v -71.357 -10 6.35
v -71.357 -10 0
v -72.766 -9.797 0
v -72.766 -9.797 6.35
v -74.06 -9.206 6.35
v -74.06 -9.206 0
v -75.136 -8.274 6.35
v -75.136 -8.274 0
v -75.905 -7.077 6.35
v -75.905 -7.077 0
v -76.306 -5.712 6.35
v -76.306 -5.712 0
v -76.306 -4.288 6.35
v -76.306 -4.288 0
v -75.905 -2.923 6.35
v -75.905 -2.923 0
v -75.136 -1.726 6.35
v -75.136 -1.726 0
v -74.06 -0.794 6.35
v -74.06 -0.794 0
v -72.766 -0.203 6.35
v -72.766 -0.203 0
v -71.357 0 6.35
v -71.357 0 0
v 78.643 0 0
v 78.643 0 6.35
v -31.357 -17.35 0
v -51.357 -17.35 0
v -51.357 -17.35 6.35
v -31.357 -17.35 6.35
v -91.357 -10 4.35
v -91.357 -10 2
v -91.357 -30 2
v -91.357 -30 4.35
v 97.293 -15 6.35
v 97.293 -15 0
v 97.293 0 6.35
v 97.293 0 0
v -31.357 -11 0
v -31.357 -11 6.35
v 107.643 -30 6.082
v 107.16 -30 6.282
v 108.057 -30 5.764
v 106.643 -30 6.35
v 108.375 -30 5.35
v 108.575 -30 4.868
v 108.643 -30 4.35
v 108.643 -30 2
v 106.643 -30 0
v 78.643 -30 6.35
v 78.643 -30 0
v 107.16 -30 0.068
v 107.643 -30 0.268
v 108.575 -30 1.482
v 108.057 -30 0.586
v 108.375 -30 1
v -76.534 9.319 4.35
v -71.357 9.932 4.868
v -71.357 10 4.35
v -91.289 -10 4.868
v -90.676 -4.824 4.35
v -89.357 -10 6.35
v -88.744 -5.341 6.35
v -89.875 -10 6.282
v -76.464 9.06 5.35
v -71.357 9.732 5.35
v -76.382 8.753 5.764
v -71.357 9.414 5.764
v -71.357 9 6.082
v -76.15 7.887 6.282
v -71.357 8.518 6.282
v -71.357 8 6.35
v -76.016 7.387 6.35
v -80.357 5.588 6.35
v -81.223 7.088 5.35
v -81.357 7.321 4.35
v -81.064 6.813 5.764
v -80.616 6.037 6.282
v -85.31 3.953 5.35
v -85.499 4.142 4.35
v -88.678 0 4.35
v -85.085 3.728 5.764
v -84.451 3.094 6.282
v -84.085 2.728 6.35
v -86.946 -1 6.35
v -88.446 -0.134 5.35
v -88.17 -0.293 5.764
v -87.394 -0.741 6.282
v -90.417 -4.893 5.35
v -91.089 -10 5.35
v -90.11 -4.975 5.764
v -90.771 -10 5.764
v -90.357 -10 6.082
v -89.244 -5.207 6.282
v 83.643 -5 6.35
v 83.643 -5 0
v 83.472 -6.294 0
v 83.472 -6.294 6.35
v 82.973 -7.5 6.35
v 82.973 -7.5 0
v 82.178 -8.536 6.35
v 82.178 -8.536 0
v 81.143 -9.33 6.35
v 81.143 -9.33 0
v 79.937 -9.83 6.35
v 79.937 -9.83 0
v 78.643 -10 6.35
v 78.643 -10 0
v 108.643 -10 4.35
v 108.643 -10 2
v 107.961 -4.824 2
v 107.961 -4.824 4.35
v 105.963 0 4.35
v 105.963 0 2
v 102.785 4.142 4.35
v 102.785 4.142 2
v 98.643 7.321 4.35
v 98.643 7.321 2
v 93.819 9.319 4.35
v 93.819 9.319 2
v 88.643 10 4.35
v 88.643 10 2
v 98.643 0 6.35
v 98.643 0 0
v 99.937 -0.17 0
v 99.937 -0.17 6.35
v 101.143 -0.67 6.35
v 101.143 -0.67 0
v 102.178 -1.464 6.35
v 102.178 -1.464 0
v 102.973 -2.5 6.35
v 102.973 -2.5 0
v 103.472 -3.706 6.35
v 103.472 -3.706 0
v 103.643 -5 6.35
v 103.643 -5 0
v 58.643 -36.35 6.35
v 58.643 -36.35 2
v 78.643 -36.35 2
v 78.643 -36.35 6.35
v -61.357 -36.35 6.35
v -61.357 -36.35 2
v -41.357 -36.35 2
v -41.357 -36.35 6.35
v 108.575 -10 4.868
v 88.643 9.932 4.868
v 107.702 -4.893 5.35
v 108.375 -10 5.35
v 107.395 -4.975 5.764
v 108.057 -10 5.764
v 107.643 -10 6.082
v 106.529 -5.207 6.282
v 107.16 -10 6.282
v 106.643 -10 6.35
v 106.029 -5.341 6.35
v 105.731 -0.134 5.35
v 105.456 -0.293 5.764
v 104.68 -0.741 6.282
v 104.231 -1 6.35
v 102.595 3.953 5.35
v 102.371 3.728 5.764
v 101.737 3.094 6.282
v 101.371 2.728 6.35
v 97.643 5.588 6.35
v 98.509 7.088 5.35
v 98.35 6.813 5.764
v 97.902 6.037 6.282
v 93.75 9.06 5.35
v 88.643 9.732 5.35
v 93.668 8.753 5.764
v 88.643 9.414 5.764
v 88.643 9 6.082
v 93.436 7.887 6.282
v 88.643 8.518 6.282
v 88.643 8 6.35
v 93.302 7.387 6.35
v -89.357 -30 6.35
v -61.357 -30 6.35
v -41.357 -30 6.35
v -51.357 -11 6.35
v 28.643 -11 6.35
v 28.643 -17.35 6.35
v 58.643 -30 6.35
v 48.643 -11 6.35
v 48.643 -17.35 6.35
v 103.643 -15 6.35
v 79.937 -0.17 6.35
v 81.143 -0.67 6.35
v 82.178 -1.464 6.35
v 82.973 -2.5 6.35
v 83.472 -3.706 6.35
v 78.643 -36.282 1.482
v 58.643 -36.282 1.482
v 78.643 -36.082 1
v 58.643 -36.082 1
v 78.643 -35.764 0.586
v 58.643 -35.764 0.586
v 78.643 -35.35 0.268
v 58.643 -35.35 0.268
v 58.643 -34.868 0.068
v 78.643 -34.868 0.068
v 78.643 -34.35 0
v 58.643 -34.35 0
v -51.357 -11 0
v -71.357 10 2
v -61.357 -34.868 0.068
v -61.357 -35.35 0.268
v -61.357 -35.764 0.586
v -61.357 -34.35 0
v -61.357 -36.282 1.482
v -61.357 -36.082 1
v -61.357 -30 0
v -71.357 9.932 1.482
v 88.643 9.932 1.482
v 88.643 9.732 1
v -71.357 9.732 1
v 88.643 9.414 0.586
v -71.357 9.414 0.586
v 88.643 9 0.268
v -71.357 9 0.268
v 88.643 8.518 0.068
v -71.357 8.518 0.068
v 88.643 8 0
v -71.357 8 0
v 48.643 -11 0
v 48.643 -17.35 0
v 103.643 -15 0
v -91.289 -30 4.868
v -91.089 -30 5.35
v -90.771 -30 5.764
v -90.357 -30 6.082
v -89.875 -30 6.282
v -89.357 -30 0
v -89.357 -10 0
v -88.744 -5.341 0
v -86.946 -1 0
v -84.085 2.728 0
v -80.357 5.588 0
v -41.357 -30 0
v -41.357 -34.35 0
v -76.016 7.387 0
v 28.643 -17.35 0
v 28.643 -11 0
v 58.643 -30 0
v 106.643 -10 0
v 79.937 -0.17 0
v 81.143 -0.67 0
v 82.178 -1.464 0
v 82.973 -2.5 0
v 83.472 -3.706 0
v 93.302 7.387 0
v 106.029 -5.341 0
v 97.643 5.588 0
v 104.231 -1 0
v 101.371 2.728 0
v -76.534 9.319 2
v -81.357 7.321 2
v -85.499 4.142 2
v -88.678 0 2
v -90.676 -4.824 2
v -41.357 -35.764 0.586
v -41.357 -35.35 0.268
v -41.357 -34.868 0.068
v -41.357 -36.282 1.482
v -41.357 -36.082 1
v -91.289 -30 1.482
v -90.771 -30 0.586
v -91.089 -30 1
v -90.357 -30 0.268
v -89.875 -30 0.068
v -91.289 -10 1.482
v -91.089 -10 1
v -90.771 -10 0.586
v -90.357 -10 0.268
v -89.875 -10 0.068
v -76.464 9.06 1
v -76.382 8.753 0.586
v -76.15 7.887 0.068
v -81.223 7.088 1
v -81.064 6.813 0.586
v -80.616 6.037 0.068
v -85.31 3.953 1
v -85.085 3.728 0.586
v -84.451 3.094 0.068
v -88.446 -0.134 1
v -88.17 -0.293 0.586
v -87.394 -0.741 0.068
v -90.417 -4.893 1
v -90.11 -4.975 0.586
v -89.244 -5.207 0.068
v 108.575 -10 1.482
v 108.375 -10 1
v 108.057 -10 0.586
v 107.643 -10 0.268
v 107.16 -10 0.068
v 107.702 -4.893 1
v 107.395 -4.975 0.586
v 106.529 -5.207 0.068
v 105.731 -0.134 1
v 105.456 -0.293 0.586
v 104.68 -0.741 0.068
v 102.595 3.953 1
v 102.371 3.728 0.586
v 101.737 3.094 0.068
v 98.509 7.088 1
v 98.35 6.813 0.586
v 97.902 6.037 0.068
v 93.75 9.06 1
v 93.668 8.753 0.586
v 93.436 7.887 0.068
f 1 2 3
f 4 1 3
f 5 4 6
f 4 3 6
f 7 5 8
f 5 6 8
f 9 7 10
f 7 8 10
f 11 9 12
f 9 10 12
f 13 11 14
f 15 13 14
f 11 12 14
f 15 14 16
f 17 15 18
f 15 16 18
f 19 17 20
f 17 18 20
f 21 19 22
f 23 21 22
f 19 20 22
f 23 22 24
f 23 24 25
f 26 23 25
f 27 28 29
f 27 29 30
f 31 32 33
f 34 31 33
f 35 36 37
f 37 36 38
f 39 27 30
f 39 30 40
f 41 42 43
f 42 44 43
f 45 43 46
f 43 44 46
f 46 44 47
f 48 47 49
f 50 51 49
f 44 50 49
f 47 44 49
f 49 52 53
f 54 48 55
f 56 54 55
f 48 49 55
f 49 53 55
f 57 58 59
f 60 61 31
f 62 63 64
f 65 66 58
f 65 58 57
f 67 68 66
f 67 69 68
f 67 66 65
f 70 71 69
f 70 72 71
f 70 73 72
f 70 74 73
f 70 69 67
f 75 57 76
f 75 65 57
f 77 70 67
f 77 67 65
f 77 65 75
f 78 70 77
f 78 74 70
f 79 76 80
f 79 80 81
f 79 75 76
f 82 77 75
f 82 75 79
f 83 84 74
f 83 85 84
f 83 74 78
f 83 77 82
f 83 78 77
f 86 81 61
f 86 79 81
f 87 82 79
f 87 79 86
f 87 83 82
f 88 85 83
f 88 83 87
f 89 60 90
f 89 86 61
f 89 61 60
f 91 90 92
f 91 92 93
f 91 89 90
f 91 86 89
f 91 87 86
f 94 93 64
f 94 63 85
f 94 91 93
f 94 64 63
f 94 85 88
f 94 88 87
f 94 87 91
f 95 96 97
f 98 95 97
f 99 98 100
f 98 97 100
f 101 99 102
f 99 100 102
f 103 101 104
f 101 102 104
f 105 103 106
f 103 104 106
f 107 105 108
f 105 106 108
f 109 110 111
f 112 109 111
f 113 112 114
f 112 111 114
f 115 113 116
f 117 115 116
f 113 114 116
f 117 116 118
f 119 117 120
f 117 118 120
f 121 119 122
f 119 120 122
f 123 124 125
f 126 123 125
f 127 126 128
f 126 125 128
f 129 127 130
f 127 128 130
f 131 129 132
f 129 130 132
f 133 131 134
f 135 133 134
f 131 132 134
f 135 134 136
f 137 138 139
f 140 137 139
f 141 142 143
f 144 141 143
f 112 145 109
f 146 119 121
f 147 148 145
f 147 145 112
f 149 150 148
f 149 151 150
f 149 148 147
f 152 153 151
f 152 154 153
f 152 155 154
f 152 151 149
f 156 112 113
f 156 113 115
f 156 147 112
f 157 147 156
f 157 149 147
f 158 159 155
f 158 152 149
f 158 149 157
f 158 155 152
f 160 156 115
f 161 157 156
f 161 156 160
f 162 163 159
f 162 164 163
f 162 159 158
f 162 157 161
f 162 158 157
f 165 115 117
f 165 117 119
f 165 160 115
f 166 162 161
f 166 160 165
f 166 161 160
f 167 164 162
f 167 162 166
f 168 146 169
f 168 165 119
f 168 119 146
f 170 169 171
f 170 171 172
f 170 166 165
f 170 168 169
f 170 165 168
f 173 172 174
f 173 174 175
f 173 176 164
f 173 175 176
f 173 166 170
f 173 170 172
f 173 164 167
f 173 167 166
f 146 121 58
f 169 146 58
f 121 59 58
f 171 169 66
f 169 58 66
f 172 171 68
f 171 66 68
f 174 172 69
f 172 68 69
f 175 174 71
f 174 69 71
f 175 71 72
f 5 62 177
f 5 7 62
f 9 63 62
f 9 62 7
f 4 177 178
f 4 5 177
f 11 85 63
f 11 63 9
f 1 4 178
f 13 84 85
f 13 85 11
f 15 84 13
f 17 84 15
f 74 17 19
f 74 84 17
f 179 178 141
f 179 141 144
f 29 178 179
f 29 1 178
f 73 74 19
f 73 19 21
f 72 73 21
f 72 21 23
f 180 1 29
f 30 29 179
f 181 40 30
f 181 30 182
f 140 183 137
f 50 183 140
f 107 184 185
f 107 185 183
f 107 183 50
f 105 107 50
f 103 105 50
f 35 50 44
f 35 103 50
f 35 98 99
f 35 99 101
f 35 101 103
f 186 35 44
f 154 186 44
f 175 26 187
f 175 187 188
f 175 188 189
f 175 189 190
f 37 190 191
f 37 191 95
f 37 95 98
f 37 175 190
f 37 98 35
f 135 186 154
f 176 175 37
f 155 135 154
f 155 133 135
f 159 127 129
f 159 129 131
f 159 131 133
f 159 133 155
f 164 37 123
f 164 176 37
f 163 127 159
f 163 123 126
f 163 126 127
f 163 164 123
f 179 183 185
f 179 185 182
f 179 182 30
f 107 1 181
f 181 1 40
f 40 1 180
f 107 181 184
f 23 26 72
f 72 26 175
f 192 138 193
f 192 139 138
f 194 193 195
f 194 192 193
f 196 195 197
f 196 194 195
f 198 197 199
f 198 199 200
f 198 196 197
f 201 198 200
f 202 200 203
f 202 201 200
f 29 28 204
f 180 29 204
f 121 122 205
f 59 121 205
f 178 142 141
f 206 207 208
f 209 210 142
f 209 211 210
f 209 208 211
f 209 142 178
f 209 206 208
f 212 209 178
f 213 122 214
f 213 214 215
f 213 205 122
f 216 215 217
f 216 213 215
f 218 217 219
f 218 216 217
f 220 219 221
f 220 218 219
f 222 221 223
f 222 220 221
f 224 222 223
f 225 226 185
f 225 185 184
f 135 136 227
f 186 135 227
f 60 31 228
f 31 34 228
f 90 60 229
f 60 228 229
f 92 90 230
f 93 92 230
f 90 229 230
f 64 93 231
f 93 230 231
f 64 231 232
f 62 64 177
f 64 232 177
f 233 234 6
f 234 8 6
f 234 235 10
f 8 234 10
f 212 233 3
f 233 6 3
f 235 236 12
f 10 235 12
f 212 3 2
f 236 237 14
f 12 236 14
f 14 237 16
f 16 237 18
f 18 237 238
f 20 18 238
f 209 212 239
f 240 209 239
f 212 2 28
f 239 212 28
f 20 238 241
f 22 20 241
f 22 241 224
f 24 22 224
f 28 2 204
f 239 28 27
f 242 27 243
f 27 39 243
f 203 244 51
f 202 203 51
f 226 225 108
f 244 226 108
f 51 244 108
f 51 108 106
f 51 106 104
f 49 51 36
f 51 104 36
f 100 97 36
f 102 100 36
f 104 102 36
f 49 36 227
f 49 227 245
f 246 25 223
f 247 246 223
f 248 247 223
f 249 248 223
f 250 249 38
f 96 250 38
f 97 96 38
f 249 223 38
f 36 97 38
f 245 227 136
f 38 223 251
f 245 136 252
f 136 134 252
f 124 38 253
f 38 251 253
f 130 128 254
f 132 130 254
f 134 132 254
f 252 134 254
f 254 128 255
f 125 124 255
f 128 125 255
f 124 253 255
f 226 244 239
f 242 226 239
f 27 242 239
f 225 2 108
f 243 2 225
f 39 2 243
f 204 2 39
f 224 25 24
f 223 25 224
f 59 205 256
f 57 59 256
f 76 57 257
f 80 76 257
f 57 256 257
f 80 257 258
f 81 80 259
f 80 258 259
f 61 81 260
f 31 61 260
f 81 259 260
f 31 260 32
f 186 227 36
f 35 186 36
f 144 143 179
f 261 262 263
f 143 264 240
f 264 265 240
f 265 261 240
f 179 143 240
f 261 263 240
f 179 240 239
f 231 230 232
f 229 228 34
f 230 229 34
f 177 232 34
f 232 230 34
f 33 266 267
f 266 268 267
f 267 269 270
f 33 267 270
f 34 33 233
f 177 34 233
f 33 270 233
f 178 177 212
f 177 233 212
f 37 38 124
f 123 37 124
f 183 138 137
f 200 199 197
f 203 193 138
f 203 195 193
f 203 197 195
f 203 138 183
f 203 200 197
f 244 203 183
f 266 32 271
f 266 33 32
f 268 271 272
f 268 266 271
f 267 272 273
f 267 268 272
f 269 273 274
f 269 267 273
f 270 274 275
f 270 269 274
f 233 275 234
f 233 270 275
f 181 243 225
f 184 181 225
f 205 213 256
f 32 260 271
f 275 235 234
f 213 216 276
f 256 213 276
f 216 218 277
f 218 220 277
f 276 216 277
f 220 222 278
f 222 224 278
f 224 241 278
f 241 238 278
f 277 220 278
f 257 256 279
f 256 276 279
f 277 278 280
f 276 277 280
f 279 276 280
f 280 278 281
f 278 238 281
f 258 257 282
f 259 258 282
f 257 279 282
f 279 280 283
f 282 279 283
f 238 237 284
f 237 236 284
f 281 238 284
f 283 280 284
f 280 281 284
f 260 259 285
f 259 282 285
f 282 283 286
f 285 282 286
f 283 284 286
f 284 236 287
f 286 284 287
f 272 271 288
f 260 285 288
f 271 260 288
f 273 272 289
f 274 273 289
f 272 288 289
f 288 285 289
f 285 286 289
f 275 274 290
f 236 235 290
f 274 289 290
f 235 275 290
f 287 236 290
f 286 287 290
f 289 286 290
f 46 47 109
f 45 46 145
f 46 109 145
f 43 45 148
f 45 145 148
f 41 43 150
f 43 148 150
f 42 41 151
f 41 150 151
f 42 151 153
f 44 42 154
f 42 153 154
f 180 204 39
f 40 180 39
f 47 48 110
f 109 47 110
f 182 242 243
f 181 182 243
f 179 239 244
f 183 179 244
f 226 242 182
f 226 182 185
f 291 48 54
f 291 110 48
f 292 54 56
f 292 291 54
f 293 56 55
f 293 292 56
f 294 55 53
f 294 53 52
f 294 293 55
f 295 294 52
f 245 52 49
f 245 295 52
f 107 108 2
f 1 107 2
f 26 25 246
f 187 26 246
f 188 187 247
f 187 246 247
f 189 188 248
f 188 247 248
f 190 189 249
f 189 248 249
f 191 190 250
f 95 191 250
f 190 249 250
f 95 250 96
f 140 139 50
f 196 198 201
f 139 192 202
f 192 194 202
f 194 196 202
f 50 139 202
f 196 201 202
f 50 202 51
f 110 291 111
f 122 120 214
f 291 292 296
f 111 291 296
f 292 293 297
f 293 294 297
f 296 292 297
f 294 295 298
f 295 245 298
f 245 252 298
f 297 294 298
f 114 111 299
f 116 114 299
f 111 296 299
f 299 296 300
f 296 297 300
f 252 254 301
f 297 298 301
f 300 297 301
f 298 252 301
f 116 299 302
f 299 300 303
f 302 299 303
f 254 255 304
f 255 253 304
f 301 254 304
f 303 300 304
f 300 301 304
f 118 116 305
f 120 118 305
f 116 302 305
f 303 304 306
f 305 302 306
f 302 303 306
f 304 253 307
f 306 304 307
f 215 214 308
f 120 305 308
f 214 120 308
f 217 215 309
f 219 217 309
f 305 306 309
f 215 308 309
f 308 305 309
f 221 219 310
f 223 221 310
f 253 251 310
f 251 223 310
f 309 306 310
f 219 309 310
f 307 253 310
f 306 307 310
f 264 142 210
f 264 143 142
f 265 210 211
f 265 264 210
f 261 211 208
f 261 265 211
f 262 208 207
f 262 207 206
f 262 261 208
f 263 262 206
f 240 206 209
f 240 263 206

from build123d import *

# Parameters (mm, degrees)
F0_W     = 20
F0_H     = 6.35
F1_DEPTH = 6.35
F2_R     = 2


with BuildPart() as f1:
    # F0 (on Top) → F1 (new body)
    with BuildSketch(Plane.XY):
        with BuildLine():
            Line((88.642785, 10), (-71.357215, 10))
            ThreePointArc((-71.357215, 10), (-85.49935, 4.142136), (-91.357215, -10))
            Line((-91.357215, -10), (-91.357215, -30))
            Line((-91.357215, -30), (-61.357215, -30))
            Line((-61.357215, -30), (-41.357215, -30))
            Line((-41.357215, -30), (58.642785, -30))
            Line((58.642785, -30), (78.642785, -30))
            Line((78.642785, -30), (108.642785, -30))
            Line((108.642785, -30), (108.642785, -10))
            ThreePointArc((108.642785, -10), (102.784921, 4.142136), (88.642785, 10))
        make_face()
        with Locations((-41.357215, -14.175)):
            Rectangle(F0_W, F0_H, mode=Mode.SUBTRACT)
        with Locations((38.642785, -14.175)):
            Rectangle(F0_W, F0_H, mode=Mode.SUBTRACT)
        with BuildLine():
            ThreePointArc((-71.357215, -10), (-76.357215, -5), (-71.357215, 0))
            Line((-71.357215, 0), (78.642785, 0))
            ThreePointArc((78.642785, 0), (82.178319, -1.464466), (83.642785, -5))
            ThreePointArc((83.642785, -5), (82.178319, -8.535534), (78.642785, -10))
            Line((78.642785, -10), (-71.357215, -10))
        make_face(mode=Mode.SUBTRACT)
        with BuildLine():
            Line((97.292785, -15), (97.292785, 0))
            Line((97.292785, 0), (98.642785, 0))
            ThreePointArc((98.642785, 0), (102.178319, -1.464466), (103.642785, -5))
            Line((103.642785, -5), (103.642785, -15))
            Line((103.642785, -15), (97.292785, -15))
        make_face(mode=Mode.SUBTRACT)
        with Locations((-51.357215, -33.175)):
            Rectangle(F0_W, F0_H)
        with Locations((68.642785, -33.175)):
            Rectangle(F0_W, F0_H)
    extrude(amount=F1_DEPTH)

    # F2
    f2_edges = [f1.edges().sort_by_distance(p)[0] for p in [
        (-85.49935, 4.142136, 6.35),
        (8.642785, 10, 0),
        (-51.357215, -36.35, 0),
        (68.642785, -36.35, 0),
    ]]
    fillet(f2_edges, radius=F2_R)


solid = f1.part
